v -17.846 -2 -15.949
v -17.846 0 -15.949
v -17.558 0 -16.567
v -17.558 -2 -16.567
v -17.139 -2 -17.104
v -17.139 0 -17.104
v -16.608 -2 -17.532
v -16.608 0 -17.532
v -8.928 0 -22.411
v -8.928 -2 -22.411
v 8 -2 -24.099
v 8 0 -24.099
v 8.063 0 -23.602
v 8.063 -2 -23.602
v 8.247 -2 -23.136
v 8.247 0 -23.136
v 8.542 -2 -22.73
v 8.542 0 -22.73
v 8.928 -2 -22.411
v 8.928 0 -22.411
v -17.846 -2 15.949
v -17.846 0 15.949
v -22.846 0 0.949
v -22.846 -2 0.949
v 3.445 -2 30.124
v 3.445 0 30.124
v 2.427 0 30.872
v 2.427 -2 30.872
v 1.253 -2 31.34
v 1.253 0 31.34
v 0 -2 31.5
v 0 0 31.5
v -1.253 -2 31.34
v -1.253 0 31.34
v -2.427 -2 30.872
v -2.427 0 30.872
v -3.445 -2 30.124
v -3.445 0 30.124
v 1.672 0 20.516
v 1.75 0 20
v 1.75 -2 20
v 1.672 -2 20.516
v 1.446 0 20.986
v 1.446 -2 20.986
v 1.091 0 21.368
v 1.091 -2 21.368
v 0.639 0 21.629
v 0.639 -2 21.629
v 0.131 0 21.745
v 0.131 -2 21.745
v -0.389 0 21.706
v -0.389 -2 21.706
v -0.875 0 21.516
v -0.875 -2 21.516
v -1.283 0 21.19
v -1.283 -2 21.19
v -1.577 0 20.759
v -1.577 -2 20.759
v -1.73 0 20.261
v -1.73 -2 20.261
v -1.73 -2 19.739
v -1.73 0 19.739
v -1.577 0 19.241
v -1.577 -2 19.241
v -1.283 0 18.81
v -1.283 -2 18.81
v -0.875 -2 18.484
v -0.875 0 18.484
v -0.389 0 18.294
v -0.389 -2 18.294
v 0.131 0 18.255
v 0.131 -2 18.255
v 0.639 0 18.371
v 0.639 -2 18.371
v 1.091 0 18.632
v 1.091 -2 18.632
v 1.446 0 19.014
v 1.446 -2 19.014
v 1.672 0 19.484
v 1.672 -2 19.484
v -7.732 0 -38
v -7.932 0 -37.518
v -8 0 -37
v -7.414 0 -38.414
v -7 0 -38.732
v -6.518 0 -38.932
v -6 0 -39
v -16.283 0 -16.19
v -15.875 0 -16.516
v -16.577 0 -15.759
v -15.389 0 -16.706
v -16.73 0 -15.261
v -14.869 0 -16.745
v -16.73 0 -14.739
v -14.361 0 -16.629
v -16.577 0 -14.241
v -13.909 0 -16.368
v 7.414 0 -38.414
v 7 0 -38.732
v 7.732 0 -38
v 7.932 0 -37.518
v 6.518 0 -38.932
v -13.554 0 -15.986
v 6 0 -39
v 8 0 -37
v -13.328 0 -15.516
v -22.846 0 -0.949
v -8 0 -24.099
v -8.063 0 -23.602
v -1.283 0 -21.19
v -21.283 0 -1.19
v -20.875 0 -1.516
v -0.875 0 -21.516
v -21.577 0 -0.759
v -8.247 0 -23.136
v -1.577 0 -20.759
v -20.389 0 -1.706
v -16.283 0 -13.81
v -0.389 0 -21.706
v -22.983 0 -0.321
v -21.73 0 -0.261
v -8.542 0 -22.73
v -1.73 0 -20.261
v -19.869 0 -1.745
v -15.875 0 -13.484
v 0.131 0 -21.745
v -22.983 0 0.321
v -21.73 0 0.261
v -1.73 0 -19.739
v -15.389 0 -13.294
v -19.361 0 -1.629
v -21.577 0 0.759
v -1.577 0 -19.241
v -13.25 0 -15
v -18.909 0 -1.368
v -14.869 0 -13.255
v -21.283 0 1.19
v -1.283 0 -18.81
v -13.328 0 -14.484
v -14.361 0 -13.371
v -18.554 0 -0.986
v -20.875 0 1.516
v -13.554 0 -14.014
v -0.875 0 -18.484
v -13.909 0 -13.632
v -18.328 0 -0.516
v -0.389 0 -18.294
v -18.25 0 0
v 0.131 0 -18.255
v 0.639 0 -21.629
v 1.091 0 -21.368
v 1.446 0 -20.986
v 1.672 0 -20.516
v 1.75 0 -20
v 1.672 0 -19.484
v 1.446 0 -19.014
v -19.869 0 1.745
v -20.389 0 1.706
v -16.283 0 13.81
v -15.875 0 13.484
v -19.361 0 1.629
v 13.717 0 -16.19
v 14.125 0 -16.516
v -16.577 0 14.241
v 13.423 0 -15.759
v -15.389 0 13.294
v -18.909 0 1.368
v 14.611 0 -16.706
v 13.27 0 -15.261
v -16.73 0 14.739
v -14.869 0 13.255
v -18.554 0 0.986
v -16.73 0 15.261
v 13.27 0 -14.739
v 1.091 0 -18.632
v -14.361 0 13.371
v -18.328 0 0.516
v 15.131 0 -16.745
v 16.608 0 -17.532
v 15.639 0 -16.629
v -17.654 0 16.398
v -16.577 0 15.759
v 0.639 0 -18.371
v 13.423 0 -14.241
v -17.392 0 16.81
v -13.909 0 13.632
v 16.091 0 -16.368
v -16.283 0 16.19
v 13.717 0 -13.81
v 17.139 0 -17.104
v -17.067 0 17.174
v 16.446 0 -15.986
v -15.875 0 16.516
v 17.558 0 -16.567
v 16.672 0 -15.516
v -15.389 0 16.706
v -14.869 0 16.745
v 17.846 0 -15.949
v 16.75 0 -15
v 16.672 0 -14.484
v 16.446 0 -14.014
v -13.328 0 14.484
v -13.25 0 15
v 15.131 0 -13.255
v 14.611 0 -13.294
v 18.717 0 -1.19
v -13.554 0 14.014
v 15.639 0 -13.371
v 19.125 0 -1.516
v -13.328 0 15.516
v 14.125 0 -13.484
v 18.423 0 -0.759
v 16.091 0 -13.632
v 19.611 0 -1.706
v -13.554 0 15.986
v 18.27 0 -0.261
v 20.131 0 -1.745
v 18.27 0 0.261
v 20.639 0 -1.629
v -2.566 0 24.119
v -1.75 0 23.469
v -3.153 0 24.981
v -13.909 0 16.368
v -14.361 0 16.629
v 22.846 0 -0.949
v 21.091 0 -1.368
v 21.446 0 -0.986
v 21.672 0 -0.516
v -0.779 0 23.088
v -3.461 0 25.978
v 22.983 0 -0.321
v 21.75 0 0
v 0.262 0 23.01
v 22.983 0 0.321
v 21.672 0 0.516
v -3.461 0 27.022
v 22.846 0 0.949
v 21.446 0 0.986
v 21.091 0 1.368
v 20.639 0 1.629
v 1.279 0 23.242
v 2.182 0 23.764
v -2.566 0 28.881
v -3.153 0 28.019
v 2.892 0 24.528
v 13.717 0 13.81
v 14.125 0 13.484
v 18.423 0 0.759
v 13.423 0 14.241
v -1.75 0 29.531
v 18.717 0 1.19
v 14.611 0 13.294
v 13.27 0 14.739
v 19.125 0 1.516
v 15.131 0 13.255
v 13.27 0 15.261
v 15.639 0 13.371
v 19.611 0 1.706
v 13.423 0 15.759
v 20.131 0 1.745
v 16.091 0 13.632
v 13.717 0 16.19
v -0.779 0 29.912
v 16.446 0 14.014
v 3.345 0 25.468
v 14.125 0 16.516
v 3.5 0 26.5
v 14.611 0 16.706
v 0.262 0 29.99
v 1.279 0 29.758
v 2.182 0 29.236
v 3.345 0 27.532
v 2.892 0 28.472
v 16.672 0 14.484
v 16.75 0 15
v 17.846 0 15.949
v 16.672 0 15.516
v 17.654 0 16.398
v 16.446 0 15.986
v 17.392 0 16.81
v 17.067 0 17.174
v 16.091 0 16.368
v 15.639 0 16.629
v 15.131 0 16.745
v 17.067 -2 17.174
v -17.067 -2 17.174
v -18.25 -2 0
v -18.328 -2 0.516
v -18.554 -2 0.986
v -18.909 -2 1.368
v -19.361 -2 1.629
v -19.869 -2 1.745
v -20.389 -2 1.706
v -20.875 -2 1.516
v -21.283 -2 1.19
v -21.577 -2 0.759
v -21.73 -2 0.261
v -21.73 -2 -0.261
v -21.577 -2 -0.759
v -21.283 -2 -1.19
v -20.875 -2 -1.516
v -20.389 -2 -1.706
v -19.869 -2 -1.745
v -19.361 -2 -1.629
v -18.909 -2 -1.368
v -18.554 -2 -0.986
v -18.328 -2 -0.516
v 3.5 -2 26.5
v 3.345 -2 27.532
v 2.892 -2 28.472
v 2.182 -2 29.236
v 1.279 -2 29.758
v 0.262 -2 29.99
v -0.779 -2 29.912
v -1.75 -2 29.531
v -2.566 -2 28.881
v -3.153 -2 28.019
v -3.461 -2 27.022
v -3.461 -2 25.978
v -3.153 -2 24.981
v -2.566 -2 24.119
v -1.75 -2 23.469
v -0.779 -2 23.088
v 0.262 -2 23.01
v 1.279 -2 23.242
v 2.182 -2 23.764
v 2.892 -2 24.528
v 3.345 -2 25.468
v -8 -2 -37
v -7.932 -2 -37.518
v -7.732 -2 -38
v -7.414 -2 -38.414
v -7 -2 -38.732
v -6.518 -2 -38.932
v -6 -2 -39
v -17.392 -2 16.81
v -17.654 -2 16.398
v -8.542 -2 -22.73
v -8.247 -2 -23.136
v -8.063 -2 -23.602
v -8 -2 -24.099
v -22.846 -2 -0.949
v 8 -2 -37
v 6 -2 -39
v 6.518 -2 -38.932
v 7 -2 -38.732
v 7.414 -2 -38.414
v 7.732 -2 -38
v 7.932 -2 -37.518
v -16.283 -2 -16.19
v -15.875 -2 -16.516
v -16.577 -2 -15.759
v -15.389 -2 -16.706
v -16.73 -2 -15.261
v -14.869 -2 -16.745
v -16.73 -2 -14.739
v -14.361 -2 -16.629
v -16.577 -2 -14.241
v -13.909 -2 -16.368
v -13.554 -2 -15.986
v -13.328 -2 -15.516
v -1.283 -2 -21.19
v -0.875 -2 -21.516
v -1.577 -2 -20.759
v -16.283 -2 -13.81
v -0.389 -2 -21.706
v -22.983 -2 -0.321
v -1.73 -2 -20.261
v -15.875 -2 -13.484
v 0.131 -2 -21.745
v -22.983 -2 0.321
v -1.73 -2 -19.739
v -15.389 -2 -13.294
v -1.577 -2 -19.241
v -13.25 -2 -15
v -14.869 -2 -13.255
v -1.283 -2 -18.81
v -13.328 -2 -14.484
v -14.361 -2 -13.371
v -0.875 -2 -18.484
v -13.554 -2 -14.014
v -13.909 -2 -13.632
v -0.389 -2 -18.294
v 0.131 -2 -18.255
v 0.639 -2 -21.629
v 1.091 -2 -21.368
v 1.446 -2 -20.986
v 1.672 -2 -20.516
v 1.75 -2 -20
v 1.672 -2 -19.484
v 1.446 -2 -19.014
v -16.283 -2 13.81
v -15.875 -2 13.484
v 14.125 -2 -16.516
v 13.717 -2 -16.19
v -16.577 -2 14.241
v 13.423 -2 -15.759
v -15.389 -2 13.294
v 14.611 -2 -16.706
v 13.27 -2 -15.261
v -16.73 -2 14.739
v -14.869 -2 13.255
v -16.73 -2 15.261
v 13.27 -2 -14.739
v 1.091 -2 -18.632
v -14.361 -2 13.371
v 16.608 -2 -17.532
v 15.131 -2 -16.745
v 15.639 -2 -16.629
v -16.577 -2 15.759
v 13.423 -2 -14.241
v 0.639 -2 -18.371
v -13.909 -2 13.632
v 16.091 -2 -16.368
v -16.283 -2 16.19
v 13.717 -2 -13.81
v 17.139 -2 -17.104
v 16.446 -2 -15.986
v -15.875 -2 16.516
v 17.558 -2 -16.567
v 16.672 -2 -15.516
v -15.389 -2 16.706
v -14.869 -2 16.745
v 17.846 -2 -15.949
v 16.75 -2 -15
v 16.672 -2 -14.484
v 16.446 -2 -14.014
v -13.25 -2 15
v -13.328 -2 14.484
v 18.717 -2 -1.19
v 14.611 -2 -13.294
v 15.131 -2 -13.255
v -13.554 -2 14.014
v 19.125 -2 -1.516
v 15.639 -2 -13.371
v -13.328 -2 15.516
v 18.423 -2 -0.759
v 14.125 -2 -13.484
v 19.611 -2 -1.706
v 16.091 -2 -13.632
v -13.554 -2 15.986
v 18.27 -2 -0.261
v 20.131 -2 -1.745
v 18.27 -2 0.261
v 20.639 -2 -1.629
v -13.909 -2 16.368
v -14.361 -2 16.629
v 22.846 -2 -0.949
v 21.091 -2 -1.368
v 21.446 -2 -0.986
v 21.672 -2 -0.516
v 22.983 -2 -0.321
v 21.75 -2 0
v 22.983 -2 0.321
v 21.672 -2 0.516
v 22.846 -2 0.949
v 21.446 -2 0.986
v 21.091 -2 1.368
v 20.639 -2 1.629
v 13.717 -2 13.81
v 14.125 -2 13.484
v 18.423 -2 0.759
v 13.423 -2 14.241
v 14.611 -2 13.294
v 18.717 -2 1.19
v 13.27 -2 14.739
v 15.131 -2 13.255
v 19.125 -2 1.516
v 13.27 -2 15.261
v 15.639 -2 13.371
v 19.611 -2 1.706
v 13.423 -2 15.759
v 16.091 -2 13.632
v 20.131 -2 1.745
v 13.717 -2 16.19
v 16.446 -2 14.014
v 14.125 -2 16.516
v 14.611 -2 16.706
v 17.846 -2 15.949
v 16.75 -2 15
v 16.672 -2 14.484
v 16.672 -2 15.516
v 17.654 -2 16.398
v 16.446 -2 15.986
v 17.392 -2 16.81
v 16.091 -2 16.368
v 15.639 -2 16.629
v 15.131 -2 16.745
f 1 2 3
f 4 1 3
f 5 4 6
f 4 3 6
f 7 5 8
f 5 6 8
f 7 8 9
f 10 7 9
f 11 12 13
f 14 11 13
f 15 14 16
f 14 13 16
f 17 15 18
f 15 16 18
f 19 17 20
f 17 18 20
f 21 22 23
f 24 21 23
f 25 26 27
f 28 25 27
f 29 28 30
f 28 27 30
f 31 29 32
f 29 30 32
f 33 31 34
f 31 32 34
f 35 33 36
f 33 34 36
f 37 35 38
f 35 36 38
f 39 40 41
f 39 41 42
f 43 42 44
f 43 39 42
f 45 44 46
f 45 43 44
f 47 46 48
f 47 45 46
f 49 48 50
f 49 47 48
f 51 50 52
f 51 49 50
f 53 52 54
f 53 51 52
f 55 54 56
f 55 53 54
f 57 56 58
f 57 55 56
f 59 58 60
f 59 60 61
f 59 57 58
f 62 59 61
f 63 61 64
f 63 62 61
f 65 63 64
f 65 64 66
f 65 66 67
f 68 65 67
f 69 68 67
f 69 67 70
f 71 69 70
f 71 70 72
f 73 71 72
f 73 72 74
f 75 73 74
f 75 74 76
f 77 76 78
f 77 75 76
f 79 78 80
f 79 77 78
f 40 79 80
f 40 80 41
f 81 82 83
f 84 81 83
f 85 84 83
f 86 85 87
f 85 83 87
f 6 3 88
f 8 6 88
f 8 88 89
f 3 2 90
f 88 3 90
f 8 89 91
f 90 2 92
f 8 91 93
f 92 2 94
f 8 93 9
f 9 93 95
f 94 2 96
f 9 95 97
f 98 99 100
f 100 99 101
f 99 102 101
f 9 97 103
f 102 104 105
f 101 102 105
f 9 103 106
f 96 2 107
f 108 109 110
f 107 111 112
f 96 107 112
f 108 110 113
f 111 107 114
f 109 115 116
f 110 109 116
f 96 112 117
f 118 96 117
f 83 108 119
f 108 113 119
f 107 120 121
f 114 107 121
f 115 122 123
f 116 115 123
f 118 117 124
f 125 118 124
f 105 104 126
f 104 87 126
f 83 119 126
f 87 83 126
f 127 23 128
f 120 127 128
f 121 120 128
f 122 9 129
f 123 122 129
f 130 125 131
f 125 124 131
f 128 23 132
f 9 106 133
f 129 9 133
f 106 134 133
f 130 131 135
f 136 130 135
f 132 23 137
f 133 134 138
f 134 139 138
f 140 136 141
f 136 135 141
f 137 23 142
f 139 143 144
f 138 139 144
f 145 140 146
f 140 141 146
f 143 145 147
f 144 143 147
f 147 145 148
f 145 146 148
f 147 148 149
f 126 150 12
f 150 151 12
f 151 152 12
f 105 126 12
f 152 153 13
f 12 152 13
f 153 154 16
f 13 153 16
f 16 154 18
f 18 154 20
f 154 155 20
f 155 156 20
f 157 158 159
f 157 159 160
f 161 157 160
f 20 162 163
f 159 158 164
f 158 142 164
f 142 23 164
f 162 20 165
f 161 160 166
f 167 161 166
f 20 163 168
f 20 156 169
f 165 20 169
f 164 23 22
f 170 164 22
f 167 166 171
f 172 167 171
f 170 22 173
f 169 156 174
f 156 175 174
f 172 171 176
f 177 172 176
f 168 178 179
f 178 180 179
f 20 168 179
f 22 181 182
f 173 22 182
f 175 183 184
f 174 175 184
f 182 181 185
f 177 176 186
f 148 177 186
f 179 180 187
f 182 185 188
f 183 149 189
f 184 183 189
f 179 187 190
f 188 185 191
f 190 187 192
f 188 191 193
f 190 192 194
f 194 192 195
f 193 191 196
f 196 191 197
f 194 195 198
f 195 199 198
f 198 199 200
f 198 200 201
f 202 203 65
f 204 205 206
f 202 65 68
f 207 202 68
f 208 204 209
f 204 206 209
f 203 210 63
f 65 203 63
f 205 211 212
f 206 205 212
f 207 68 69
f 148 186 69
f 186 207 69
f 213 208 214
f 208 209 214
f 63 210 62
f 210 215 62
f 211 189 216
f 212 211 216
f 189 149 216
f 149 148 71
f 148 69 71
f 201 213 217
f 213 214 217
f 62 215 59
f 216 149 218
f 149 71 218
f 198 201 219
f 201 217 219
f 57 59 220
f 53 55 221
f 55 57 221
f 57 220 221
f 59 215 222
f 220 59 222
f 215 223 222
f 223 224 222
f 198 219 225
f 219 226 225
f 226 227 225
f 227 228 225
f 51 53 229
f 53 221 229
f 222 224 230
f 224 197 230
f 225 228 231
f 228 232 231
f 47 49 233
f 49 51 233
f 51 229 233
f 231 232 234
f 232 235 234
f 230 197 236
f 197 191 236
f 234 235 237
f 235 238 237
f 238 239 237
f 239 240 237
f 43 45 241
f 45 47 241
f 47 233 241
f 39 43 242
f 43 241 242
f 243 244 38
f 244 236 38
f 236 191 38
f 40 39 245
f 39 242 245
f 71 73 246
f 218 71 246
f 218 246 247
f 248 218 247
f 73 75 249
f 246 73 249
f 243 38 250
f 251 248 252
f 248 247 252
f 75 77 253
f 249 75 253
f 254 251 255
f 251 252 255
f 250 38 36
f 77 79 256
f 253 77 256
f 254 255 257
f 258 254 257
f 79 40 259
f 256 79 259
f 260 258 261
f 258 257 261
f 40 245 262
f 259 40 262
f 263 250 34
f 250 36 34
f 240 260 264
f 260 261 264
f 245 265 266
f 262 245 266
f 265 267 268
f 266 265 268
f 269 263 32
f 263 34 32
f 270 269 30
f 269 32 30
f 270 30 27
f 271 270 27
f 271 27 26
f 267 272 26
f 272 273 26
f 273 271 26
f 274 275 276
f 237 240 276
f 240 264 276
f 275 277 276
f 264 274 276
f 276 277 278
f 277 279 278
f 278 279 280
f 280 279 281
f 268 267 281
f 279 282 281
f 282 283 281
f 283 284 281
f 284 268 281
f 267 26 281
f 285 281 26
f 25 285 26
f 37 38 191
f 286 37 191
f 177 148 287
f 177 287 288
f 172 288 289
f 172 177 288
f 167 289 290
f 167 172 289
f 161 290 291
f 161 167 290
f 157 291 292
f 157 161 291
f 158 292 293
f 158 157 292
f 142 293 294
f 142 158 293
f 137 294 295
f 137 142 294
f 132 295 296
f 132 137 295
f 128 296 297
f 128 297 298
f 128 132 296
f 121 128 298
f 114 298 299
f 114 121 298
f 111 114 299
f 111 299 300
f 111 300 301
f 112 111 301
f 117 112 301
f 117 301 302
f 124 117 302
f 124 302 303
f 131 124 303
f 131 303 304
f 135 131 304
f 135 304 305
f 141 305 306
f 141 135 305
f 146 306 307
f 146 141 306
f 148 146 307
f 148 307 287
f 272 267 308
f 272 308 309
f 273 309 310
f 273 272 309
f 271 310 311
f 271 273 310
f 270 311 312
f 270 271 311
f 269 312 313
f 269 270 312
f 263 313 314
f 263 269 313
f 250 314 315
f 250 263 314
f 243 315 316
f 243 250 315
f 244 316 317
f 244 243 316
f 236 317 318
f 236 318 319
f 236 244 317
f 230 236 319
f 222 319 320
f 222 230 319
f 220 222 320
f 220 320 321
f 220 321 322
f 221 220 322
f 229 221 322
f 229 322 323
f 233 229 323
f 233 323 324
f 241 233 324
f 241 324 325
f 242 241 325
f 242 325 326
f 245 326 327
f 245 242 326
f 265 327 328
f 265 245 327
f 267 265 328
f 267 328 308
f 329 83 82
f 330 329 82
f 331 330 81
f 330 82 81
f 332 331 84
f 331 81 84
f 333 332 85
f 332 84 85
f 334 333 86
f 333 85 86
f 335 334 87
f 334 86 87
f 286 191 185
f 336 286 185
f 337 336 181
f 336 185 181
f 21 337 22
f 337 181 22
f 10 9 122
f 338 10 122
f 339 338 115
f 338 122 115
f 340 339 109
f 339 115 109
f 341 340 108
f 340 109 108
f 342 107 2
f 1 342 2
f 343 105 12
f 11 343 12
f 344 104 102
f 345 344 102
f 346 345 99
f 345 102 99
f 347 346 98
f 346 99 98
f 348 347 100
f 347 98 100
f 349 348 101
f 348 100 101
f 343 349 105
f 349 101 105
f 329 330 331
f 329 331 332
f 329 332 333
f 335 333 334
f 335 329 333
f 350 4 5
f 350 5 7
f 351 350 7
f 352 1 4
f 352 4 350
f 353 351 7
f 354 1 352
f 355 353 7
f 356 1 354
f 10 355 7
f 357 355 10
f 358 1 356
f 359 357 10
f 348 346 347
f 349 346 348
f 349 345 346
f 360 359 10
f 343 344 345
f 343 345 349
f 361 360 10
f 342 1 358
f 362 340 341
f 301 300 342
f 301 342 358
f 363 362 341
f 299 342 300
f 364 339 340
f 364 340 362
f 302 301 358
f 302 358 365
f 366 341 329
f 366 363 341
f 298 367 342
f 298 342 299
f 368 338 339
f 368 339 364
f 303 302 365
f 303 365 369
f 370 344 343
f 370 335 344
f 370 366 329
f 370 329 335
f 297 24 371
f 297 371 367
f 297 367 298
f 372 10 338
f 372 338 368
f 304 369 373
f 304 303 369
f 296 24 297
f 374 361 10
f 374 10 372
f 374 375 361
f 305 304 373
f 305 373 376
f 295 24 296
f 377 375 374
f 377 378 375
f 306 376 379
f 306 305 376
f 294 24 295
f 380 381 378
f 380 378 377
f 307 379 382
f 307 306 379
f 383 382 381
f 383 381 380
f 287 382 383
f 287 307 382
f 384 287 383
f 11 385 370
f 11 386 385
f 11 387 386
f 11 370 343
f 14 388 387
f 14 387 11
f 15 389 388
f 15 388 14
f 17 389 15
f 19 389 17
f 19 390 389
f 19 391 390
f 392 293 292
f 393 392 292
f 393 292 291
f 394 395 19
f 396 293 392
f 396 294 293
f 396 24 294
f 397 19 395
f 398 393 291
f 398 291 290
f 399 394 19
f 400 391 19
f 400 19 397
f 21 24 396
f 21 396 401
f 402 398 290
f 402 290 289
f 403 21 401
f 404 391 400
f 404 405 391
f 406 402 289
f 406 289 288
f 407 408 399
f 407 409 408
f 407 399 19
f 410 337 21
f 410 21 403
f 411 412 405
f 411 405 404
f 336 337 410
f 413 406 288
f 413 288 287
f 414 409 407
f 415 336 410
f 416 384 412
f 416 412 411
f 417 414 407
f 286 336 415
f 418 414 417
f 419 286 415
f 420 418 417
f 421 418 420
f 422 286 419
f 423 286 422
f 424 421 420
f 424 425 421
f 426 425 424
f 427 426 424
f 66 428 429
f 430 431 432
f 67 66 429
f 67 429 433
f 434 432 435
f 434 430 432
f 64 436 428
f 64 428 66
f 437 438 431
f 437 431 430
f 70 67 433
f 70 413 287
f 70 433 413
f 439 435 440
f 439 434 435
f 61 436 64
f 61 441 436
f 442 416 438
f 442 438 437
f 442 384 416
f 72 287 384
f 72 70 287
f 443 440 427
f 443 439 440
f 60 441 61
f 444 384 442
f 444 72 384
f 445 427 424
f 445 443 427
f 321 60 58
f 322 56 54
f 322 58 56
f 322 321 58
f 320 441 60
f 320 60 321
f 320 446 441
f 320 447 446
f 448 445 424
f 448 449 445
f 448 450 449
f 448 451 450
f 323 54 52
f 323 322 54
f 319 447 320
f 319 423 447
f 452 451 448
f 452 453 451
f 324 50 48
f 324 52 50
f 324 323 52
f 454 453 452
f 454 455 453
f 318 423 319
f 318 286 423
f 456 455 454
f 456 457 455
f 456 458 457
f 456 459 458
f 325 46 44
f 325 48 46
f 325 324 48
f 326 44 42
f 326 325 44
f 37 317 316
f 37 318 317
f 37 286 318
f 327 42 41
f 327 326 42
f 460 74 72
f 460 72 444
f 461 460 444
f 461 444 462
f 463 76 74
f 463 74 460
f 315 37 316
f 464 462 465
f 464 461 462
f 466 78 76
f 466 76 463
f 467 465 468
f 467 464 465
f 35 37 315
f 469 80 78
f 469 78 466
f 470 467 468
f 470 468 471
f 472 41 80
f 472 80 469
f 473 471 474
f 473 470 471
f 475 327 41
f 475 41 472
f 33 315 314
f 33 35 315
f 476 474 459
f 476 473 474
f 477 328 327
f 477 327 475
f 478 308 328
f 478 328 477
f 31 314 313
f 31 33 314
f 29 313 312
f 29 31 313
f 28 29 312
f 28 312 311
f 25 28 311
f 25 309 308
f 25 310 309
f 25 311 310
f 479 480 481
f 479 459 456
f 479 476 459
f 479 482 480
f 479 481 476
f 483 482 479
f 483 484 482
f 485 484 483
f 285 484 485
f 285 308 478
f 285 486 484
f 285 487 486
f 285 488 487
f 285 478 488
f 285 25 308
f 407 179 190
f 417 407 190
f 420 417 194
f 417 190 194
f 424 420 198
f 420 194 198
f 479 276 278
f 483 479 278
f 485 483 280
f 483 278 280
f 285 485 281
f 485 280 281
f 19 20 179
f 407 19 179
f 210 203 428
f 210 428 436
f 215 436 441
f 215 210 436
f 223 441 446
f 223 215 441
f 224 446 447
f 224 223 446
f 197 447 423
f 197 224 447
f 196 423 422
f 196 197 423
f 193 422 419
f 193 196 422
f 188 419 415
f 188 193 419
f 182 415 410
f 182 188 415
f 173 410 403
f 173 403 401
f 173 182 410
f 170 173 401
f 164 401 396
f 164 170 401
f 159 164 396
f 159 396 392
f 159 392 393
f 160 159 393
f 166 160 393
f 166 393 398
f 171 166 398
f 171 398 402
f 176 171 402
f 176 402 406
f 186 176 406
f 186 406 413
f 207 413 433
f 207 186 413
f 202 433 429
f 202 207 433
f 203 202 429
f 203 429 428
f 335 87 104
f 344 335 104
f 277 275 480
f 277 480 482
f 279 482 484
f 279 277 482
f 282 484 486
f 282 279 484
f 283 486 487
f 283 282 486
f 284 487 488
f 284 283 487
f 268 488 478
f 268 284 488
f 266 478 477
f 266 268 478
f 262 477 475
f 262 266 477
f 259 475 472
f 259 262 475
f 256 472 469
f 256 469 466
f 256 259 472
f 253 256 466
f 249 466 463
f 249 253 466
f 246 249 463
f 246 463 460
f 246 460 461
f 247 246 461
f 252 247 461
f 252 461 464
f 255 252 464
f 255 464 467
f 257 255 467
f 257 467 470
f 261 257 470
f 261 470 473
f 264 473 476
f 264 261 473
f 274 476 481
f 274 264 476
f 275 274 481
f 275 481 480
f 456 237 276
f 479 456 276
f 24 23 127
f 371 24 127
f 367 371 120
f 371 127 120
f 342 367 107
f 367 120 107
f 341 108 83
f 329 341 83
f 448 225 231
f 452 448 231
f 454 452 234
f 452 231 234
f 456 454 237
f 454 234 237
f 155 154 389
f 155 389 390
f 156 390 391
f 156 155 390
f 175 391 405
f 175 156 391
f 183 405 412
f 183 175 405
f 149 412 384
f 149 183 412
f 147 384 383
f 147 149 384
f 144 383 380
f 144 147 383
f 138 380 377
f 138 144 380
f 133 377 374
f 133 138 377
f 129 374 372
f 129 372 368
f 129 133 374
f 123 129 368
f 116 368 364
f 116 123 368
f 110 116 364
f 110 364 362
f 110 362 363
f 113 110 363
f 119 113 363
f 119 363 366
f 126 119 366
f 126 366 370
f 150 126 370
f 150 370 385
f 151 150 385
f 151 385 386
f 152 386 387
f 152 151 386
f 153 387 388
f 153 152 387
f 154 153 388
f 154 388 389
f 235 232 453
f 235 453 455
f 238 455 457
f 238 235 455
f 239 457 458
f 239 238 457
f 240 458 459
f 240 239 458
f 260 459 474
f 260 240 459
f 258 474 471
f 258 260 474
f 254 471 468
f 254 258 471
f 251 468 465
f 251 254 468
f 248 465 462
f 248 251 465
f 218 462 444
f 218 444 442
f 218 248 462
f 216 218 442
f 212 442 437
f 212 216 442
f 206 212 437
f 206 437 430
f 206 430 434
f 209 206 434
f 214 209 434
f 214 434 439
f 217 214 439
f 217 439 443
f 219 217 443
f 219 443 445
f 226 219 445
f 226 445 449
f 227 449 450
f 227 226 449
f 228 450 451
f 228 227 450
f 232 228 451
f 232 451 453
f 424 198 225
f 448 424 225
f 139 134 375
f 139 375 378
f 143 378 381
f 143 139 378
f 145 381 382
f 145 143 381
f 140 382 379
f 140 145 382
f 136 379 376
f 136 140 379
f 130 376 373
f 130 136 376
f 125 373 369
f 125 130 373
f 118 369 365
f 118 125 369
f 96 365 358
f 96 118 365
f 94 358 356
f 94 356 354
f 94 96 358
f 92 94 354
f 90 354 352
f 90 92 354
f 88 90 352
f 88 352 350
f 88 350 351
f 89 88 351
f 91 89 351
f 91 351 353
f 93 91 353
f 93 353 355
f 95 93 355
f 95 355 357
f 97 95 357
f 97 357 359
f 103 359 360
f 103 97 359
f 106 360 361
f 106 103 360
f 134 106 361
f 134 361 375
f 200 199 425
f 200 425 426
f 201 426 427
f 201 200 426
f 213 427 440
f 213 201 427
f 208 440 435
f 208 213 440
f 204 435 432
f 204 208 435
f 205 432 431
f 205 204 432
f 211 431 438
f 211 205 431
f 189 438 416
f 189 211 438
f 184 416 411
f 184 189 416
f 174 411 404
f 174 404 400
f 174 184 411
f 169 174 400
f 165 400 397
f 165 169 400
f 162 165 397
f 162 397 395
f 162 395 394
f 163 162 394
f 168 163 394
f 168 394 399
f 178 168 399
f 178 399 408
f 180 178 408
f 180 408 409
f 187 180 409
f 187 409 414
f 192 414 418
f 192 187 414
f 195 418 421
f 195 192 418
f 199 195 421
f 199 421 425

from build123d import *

# Parameters (mm, degrees)
F0_R     = 1.75
F0_R_2   = 3.5
F1_DEPTH = 2


with BuildPart() as f1:
    # F0 (on Front) → F1 (new body)
    with BuildSketch(Plane.XZ):
        with BuildLine():
            Line((8.927711, -22.410767), (16.608433, -17.532379))
            ThreePointArc((16.608433, -17.532379), (17.363816, -16.847261), (17.84605, -15.948683))
            Line((17.84605, -15.948683), (22.84605, -0.948683))
            ThreePointArc((22.84605, -0.948683), (23, 0), (22.84605, 0.948683))
            Line((22.84605, 0.948683), (17.84605, 15.948683))
            ThreePointArc((17.84605, 15.948683), (17.531795, 16.609352), (17.066972, 17.174311))
            Line((17.066972, 17.174311), (3.444953, 30.123852))
            ThreePointArc((3.444953, 30.123852), (0, 31.5), (-3.444953, 30.123852))
            Line((-3.444953, 30.123852), (-17.066972, 17.174311))
            ThreePointArc((-17.066972, 17.174311), (-17.531795, 16.609352), (-17.84605, 15.948683))
            Line((-17.84605, 15.948683), (-22.84605, 0.948683))
            ThreePointArc((-22.84605, 0.948683), (-23, 0), (-22.84605, -0.948683))
            Line((-22.84605, -0.948683), (-17.84605, -15.948683))
            ThreePointArc((-17.84605, -15.948683), (-17.363816, -16.847261), (-16.608433, -17.532379))
            Line((-16.608433, -17.532379), (-8.927711, -22.410767))
            ThreePointArc((-8.927711, -22.410767), (-8.247205, -23.135842), (-8, -24.09902))
            Line((-8, -24.09902), (-8, -37))
            ThreePointArc((-8, -37), (-7.414214, -38.414214), (-6, -39))
            Line((-6, -39), (6, -39))
            ThreePointArc((6, -39), (7.414214, -38.414214), (8, -37))
            Line((8, -37), (8, -24.09902))
            ThreePointArc((8, -24.09902), (8.247205, -23.135842), (8.927711, -22.410767))
        make_face()
        with Locations((-15, -15)):
            Circle(F0_R, mode=Mode.SUBTRACT)
        with Locations((0, -20)):
            Circle(F0_R, mode=Mode.SUBTRACT)
        with Locations((15, -15)):
            Circle(F0_R, mode=Mode.SUBTRACT)
        with Locations((-20, 0)):
            Circle(F0_R, mode=Mode.SUBTRACT)
        with Locations((-15, 15)):
            Circle(F0_R, mode=Mode.SUBTRACT)
        with Locations((20, 0)):
            Circle(F0_R, mode=Mode.SUBTRACT)
        with Locations((0, 20)):
            Circle(F0_R, mode=Mode.SUBTRACT)
        with Locations((0, 26.5)):
            Circle(F0_R_2, mode=Mode.SUBTRACT)
        with Locations((15, 15)):
            Circle(F0_R, mode=Mode.SUBTRACT)
    extrude(amount=F1_DEPTH)


solid = f1.part
